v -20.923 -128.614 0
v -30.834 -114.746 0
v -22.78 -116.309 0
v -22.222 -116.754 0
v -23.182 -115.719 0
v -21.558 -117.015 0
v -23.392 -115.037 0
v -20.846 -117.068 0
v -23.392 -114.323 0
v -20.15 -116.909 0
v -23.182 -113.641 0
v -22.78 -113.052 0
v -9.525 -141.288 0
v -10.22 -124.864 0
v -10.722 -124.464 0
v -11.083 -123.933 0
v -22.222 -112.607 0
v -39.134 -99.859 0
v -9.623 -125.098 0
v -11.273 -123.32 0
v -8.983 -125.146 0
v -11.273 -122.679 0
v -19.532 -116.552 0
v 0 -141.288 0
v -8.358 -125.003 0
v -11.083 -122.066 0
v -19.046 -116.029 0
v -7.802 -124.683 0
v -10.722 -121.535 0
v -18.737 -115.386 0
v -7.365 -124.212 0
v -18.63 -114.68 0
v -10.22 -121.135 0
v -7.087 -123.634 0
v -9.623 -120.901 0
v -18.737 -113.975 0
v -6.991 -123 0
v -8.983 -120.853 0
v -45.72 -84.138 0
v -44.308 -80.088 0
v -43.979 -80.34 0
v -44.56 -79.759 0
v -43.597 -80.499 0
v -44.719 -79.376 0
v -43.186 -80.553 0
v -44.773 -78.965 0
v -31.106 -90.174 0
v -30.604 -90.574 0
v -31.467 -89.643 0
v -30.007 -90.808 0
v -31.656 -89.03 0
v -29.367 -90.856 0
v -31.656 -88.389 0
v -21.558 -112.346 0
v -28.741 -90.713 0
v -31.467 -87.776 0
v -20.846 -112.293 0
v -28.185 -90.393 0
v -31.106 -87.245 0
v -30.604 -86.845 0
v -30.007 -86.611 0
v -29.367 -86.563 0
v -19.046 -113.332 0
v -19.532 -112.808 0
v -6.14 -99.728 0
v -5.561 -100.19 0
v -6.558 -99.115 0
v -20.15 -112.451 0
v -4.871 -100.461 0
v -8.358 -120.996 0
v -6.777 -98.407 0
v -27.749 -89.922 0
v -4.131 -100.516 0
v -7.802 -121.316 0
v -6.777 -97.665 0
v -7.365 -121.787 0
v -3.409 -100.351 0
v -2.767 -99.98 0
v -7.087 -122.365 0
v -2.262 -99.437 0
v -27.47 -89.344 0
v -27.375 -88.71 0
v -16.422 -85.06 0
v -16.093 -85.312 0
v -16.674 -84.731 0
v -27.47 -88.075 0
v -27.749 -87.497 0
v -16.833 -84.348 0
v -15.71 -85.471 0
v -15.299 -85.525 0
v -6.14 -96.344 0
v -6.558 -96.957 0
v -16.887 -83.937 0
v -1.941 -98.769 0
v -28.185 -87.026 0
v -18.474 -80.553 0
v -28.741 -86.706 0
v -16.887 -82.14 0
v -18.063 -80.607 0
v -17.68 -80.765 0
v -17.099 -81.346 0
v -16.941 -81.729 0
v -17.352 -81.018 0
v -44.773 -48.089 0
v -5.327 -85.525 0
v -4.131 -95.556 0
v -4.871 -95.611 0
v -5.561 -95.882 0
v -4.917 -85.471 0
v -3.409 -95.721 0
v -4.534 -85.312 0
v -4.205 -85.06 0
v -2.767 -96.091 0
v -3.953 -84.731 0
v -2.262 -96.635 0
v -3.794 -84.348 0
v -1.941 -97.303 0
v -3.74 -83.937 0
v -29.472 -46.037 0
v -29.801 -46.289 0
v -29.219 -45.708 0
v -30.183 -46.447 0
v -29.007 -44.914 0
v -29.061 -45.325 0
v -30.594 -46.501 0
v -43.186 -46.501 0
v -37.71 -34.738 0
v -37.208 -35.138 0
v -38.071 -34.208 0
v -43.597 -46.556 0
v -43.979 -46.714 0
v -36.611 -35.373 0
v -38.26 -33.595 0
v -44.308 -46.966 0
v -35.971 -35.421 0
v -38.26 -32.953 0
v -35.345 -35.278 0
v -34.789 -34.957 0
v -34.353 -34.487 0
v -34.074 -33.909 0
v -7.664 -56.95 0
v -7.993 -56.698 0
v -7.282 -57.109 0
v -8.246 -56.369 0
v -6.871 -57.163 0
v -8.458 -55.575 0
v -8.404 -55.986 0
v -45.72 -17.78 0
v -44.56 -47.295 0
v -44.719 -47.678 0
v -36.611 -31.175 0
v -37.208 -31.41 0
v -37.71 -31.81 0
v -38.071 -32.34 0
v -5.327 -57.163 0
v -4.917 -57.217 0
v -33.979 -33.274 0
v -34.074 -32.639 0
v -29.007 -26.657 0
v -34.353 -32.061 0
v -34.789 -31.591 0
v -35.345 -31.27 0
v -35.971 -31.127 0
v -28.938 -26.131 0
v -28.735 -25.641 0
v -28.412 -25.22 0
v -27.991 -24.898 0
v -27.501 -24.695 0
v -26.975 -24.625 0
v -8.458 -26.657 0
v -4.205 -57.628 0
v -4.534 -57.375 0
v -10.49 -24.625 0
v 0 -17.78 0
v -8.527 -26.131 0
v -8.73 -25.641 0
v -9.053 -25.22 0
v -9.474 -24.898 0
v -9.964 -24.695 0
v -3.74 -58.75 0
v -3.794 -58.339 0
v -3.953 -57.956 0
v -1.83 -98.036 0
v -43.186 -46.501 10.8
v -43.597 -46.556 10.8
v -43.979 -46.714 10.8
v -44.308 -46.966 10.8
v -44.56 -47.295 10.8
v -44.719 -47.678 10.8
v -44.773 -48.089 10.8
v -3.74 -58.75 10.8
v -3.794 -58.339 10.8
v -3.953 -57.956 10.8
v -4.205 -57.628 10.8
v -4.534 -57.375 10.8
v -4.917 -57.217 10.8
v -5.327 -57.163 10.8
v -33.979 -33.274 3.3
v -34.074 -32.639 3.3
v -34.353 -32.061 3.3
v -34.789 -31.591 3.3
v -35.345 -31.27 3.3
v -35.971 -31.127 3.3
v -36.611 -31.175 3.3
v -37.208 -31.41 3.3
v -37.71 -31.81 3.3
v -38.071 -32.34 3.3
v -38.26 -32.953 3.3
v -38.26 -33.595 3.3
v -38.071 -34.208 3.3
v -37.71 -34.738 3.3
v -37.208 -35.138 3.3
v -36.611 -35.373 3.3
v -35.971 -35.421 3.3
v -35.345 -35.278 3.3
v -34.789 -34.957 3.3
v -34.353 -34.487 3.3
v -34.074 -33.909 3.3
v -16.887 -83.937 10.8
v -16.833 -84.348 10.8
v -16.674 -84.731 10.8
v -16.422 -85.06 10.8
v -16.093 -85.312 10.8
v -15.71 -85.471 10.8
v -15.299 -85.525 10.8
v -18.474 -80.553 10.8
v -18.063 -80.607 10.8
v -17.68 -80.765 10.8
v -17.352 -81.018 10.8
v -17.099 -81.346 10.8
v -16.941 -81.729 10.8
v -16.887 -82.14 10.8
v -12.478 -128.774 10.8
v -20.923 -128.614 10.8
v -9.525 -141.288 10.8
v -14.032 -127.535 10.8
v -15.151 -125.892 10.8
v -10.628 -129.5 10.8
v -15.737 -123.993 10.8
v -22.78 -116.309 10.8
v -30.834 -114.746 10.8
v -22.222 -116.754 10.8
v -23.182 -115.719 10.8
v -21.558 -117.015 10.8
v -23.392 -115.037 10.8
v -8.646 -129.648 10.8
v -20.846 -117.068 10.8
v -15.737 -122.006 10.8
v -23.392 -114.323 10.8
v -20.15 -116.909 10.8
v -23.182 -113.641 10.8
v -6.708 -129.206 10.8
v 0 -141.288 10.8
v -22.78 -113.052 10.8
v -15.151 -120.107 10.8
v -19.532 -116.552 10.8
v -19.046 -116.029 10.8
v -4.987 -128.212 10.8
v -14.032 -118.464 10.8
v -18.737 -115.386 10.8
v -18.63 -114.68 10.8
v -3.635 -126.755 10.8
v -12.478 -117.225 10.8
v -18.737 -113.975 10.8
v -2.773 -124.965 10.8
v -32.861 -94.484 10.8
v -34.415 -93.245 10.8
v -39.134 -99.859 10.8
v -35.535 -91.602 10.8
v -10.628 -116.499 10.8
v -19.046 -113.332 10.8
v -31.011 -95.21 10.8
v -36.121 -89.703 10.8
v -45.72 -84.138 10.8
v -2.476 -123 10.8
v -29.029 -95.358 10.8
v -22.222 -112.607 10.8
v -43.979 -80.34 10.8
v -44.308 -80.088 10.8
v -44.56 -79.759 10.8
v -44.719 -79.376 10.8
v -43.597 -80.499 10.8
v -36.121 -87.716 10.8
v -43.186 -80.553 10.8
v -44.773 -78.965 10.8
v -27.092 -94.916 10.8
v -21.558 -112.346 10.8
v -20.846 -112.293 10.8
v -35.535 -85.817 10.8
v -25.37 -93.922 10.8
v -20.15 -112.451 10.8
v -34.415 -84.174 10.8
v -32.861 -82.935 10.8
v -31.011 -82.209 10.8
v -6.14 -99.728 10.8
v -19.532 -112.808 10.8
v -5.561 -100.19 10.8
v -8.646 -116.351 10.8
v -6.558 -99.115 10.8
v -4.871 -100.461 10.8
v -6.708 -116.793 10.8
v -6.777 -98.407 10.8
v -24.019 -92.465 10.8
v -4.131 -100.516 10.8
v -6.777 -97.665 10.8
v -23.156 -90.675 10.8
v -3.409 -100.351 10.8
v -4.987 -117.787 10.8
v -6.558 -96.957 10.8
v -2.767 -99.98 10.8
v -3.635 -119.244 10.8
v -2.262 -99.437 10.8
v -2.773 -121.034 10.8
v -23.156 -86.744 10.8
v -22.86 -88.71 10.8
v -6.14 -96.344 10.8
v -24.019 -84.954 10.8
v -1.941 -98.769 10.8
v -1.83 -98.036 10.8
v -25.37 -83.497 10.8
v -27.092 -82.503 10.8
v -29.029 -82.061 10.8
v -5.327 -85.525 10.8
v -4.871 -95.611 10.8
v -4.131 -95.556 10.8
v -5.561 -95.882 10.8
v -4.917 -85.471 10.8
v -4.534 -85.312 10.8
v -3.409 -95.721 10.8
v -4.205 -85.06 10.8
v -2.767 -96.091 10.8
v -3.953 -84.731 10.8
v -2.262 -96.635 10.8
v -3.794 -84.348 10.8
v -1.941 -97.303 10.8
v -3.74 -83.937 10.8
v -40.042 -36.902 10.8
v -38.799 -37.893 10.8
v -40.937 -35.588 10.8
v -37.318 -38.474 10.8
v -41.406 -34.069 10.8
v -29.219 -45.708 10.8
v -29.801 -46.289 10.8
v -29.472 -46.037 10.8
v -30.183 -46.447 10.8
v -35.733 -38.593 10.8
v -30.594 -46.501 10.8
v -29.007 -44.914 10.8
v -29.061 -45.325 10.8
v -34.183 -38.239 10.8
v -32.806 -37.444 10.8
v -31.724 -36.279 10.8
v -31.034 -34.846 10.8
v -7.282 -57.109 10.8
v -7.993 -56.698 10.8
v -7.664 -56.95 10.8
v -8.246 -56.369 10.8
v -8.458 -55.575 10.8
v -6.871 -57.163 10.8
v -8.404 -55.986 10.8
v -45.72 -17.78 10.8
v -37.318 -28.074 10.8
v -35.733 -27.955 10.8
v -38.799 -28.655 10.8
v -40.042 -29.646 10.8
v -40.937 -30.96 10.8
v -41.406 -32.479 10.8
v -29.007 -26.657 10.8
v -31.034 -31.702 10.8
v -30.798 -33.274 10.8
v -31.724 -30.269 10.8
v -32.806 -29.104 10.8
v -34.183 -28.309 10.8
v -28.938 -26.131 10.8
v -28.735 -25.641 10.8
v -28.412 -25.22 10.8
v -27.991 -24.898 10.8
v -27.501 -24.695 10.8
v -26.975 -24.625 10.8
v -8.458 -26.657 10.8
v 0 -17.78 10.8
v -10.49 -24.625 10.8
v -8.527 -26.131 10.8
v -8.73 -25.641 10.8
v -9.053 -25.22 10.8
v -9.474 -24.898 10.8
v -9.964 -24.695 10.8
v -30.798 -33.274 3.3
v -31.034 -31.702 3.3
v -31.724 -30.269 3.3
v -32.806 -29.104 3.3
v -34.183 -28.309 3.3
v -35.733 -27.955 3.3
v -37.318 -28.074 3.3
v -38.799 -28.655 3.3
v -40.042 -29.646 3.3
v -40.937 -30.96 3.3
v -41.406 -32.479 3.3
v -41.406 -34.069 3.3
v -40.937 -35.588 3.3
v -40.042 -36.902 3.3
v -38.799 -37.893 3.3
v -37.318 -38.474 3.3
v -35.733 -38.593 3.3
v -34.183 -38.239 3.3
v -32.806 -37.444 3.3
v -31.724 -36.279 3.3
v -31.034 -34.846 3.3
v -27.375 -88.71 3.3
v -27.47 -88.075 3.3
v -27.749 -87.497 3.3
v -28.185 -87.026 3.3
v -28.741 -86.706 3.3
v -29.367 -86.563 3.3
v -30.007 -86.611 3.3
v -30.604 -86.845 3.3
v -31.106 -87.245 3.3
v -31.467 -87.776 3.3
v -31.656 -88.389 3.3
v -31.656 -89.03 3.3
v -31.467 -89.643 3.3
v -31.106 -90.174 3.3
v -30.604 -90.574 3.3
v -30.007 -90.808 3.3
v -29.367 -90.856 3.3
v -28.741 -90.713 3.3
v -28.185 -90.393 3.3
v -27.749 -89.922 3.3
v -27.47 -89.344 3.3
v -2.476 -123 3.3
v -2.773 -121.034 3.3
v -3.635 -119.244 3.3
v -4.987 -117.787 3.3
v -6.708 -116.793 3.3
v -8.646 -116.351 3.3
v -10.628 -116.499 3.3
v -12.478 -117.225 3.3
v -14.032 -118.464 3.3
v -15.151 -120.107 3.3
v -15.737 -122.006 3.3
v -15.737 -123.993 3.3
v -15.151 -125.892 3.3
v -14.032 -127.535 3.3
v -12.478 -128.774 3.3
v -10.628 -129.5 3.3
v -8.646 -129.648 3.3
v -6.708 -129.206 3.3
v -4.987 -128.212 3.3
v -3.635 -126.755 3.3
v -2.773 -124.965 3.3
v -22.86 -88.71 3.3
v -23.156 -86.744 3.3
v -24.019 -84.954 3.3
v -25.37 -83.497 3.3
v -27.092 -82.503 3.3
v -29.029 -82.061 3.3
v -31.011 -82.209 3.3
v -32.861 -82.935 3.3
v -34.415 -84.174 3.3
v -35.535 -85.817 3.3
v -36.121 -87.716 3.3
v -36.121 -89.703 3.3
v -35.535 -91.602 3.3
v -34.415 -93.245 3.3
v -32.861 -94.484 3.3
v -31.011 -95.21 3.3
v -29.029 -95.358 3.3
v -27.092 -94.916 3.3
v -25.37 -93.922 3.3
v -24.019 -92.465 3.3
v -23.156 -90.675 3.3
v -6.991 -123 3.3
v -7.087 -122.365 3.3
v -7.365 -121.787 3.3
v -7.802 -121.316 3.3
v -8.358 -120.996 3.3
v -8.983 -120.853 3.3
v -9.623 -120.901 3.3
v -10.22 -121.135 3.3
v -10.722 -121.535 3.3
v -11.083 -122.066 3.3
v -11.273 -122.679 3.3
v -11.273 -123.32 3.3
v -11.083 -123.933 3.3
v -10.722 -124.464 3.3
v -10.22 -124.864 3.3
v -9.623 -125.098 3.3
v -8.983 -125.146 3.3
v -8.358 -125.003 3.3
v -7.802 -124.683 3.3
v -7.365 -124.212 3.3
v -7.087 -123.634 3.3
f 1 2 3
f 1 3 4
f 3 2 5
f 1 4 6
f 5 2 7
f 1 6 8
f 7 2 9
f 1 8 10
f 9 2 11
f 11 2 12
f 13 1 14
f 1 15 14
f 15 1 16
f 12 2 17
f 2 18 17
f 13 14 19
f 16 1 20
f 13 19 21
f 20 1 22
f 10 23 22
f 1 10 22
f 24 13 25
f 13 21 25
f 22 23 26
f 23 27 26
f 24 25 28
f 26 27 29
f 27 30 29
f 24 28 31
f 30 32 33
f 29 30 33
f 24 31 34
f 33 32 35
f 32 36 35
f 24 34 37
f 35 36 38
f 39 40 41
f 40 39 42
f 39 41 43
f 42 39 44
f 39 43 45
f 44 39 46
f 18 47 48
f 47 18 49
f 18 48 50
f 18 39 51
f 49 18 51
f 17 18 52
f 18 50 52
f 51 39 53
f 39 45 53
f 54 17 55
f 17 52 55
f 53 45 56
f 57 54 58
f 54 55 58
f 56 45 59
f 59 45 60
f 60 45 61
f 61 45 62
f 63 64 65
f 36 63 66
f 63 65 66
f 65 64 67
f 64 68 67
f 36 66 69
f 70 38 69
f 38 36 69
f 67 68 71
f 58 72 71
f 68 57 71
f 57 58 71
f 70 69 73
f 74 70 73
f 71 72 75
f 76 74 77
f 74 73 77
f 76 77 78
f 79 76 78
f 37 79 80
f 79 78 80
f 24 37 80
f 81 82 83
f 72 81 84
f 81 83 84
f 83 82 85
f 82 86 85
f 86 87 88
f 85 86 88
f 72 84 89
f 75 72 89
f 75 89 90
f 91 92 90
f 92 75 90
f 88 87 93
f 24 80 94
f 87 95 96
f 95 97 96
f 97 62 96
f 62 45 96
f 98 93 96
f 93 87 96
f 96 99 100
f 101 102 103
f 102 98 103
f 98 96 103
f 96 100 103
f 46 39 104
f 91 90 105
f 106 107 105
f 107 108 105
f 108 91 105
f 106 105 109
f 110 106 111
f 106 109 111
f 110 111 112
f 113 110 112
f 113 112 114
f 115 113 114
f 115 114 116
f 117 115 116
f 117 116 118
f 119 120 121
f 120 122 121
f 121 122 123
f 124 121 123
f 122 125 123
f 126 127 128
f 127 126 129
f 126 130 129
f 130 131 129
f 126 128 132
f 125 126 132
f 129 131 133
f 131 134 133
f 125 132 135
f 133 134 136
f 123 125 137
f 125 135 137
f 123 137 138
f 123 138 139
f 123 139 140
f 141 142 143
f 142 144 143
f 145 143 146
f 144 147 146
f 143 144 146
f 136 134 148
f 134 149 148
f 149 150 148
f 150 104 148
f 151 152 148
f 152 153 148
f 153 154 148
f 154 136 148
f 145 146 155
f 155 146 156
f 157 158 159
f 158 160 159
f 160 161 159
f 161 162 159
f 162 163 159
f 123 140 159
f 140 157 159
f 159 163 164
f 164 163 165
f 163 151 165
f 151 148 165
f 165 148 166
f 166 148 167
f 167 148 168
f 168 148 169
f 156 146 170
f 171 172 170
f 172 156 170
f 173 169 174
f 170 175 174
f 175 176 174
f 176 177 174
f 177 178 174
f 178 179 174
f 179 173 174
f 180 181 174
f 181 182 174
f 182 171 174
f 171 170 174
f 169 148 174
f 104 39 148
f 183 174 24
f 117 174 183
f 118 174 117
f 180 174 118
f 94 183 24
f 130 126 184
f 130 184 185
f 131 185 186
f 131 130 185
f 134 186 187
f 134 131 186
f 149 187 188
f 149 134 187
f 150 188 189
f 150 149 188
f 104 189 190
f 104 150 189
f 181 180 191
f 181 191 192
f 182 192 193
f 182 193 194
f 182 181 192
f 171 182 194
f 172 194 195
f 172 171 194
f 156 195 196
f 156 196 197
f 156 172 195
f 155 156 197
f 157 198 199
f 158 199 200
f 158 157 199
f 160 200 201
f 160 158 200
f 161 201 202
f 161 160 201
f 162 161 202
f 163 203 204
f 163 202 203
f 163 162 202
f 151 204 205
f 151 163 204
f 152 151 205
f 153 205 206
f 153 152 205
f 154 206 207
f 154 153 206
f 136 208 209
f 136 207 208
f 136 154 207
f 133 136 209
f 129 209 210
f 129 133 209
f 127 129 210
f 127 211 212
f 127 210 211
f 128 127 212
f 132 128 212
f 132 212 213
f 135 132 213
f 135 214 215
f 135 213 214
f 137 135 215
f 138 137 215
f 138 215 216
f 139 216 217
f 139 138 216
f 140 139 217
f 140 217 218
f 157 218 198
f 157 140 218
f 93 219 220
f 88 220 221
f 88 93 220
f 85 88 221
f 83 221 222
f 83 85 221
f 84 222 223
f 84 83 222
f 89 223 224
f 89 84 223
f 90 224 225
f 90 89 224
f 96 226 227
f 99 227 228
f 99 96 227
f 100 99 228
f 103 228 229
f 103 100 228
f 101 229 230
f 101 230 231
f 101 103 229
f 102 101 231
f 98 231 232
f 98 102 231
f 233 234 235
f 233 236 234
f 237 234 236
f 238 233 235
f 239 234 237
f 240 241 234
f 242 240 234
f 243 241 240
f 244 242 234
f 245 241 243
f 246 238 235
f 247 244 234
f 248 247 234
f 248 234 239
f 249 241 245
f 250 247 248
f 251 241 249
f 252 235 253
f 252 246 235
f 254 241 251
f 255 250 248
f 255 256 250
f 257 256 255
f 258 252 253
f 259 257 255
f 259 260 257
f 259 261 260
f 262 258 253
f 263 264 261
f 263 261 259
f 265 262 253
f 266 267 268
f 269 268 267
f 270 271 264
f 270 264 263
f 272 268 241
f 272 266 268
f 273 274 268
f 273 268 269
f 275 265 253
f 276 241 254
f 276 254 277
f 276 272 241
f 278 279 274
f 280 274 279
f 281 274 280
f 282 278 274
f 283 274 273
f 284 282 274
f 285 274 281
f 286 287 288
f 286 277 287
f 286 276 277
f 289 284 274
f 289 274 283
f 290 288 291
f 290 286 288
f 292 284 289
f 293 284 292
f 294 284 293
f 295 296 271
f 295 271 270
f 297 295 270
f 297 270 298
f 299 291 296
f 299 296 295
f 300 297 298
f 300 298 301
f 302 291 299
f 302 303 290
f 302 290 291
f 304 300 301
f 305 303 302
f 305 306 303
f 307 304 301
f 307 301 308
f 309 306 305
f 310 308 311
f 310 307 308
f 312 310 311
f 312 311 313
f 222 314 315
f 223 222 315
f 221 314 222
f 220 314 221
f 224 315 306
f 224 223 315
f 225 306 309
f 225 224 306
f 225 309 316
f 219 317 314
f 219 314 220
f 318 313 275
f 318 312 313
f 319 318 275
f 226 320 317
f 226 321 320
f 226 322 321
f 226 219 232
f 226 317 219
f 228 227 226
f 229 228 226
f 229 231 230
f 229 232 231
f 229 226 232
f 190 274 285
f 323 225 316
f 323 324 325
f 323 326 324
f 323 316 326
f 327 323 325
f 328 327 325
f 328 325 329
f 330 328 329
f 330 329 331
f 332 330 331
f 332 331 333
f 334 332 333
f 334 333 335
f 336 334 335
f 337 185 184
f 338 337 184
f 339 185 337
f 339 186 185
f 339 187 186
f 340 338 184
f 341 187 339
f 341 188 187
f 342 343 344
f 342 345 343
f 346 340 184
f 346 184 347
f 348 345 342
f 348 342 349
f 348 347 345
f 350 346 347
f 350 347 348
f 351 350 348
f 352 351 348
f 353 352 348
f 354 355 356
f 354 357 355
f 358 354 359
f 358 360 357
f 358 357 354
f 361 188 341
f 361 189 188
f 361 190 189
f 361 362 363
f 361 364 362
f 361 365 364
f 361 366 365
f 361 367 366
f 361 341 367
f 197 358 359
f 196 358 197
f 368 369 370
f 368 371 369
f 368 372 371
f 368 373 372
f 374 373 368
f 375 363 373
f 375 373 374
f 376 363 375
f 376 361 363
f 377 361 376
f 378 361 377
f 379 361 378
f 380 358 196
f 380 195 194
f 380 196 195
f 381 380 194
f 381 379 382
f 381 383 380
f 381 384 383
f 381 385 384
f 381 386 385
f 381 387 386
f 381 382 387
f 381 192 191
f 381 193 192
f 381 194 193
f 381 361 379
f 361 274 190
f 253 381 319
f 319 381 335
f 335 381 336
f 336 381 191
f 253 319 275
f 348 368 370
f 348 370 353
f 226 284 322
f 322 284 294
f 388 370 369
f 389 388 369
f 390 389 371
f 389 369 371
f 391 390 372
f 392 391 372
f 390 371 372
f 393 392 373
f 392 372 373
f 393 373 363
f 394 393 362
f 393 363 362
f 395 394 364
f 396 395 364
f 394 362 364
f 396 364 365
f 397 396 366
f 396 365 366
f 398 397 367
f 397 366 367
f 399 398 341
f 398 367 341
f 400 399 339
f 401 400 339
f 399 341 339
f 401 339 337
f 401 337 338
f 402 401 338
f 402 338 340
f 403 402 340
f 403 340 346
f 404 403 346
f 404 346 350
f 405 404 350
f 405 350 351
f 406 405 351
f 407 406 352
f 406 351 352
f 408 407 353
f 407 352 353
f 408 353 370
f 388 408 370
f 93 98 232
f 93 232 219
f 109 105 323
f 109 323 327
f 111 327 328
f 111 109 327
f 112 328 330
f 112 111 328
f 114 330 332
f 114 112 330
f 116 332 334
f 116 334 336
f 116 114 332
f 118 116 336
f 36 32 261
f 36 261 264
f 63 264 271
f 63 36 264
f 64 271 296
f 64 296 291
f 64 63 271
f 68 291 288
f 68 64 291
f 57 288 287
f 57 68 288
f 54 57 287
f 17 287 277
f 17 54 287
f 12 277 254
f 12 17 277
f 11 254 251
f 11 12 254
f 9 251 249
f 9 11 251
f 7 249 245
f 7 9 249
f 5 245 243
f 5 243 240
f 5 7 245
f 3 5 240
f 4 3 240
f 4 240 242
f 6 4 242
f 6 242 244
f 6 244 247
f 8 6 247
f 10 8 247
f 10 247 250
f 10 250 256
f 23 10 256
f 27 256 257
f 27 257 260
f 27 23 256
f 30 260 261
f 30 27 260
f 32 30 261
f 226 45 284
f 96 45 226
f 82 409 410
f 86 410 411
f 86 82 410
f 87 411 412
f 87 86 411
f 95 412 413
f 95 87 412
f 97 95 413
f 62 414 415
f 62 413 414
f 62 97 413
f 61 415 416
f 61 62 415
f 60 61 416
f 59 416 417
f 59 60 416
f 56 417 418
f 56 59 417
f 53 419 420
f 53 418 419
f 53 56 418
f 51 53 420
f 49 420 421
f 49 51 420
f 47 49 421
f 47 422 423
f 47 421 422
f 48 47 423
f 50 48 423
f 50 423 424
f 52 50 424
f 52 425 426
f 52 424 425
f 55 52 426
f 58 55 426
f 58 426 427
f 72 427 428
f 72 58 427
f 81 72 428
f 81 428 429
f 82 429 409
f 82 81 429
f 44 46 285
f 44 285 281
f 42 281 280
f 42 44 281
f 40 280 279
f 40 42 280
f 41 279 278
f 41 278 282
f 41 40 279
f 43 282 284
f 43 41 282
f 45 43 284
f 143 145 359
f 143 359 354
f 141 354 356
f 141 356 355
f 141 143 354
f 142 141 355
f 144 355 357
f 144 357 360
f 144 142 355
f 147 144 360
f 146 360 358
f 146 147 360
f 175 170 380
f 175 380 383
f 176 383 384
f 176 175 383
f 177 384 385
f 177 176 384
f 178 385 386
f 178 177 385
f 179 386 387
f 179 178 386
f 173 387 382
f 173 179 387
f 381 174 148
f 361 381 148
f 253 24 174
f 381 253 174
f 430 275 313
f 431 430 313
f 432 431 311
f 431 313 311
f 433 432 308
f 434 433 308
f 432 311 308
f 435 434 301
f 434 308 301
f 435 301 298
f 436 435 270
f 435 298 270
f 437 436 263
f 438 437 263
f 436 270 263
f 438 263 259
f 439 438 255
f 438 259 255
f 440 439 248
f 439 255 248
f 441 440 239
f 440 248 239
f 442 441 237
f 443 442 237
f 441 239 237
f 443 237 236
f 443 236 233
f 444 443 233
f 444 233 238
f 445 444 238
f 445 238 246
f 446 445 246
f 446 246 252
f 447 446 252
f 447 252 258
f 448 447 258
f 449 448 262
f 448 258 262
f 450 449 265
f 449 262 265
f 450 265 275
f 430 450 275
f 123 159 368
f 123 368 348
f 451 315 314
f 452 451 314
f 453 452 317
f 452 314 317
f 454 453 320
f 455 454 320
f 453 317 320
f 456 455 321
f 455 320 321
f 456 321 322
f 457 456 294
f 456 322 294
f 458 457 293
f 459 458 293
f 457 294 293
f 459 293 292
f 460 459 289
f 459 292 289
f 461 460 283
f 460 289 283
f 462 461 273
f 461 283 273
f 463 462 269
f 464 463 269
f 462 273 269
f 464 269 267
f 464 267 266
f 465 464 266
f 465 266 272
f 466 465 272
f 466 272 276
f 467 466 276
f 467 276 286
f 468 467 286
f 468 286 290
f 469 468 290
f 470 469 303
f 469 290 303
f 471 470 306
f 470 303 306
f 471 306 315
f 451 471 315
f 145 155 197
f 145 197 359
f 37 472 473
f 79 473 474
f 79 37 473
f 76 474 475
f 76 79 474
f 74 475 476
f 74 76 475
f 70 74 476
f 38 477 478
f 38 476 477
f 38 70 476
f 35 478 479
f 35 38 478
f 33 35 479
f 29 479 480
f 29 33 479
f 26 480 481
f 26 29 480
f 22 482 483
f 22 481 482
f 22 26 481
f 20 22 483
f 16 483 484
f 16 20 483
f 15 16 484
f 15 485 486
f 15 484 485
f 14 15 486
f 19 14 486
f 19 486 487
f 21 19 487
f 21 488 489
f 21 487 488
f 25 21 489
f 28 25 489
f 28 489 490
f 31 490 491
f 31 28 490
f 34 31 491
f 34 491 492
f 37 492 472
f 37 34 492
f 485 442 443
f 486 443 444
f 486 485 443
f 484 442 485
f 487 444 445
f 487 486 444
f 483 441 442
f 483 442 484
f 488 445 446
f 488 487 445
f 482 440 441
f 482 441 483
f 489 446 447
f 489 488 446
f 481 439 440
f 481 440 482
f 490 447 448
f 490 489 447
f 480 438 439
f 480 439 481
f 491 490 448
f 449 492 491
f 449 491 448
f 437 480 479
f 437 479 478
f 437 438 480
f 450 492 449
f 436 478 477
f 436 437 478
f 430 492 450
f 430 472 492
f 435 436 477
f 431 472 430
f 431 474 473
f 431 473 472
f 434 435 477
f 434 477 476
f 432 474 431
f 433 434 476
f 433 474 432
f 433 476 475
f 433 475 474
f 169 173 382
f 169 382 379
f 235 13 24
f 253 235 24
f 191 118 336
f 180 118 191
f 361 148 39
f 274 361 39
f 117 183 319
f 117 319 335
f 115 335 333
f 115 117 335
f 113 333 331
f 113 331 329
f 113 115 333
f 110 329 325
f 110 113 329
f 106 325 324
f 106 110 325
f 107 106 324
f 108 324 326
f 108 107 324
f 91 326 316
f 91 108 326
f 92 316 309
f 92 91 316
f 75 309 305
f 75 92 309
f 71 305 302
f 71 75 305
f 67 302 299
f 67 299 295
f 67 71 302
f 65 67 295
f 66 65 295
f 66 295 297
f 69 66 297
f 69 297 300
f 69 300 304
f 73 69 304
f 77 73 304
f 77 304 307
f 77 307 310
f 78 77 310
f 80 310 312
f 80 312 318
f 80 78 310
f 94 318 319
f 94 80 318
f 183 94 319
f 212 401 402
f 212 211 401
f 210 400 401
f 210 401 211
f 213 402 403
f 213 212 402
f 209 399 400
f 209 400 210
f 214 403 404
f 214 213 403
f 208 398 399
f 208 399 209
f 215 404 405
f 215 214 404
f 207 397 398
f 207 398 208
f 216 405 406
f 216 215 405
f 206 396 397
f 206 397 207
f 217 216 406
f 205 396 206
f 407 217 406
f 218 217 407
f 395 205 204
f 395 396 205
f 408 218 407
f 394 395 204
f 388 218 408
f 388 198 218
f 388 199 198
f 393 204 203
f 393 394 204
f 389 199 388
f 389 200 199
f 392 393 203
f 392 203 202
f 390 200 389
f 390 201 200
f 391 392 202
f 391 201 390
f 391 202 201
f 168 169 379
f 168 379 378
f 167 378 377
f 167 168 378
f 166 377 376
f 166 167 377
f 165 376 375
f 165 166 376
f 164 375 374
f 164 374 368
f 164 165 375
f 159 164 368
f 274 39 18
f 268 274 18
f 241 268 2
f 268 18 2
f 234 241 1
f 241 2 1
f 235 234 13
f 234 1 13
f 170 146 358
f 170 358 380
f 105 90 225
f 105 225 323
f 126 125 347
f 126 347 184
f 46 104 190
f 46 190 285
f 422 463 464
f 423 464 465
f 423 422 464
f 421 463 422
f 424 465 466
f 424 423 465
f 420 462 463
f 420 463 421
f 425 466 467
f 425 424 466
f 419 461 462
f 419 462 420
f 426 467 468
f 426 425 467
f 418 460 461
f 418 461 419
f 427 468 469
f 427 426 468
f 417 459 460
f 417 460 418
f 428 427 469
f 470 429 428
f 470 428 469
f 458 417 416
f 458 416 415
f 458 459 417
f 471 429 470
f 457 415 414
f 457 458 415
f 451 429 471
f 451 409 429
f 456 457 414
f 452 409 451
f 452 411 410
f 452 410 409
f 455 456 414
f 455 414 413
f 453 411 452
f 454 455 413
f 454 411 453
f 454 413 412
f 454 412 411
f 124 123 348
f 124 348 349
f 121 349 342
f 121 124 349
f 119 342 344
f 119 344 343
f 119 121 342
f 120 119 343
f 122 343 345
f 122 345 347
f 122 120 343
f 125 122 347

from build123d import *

# Parameters (mm, degrees)
SKETCH1_R           = 2.15265
SKETCH1_R_2         = 2.487009827
SKETCH1_R_3         = 2.39450721
BOSS_EXTRUDE1_DEPTH = 10.8
SKETCH3_R           = 6.6675
SKETCH3_R_2         = 5.334
CUT_EXTRUDE1_DEPTH  = 7.5


with BuildPart() as part:
    # Sketch1 → Boss-Extrude1 (new body)
    with BuildSketch(Plane.XY):
        with BuildLine():
            Line((0, -17.78), (-45.72, -17.78))
            Line((-45.72, -17.78), (-45.72, -84.1375))
            ThreePointArc((-45.72, -84.1375), (-30.833523511, -114.746148224), (-9.525, -141.2875))
            Line((-9.525, -141.2875), (0, -141.2875))
            Line((0, -141.2875), (0, -17.78))
        make_face()
        with Locations((-36.1315, -33.274)):
            Circle(SKETCH1_R, mode=Mode.SUBTRACT)
        with Locations((-29.5275, -88.7095)):
            Circle(SKETCH1_R, mode=Mode.SUBTRACT)
        with Locations((-9.144, -122.9995)):
            Circle(SKETCH1_R, mode=Mode.SUBTRACT)
        with Locations((-4.3173518, -98.035919174)):
            Circle(SKETCH1_R_2, mode=Mode.SUBTRACT)
        with Locations((-21.024674116, -114.680376144)):
            Circle(SKETCH1_R_3, mode=Mode.SUBTRACT)
        with BuildLine():
            Line((-30.5943, -46.501483685), (-43.185677441, -46.501483685))
            ThreePointArc((-43.185677441, -46.501483685), (-44.308209457, -46.96645167), (-44.773177441, -48.088983685))
            Line((-44.773177441, -48.088983685), (-44.773177441, -78.965225138))
            ThreePointArc((-44.773177441, -78.965225138), (-44.308209457, -80.087757153), (-43.185677441, -80.552725138))
            Line((-43.185677441, -80.552725138), (-18.474223541, -80.552725138))
            ThreePointArc((-18.474223541, -80.552725138), (-17.351691526, -81.017693123), (-16.886723541, -82.140225138))
            Line((-16.886723541, -82.140225138), (-16.886723541, -83.937143103))
            ThreePointArc((-16.886723541, -83.937143103), (-16.421755557, -85.059675118), (-15.299223541, -85.524643103))
            Line((-15.299223541, -85.524643103), (-5.327492268, -85.524643103))
            ThreePointArc((-5.327492268, -85.524643103), (-4.204960252, -85.059675118), (-3.739992268, -83.937143103))
            Line((-3.739992268, -83.937143103), (-3.739992268, -58.7502))
            ThreePointArc((-3.739992268, -58.7502), (-4.204960252, -57.627667985), (-5.327492268, -57.1627))
            Line((-5.327492268, -57.1627), (-6.8707, -57.1627))
            ThreePointArc((-6.8707, -57.1627), (-7.993232015, -56.697732015), (-8.4582, -55.5752))
            Line((-8.4582, -55.5752), (-8.4582, -26.6573))
            ThreePointArc((-8.4582, -26.6573), (-9.053359021, -25.220459021), (-10.4902, -24.6253))
            Line((-10.4902, -24.6253), (-26.9748, -24.6253))
            ThreePointArc((-26.9748, -24.6253), (-28.411640979, -25.220459021), (-29.0068, -26.6573))
            Line((-29.0068, -26.6573), (-29.0068, -44.913983685))
            ThreePointArc((-29.0068, -44.913983685), (-29.471767985, -46.036515701), (-30.5943, -46.501483685))
        make_face(mode=Mode.SUBTRACT)
    extrude(amount=BOSS_EXTRUDE1_DEPTH)

    # Sketch3 → Cut-Extrude1 (cut)
    with BuildSketch(Plane.XY.offset(10.8)):
        with Locations((-9.144, -122.9995)):
            Circle(SKETCH3_R)
        with Locations((-29.5275, -88.7095)):
            Circle(SKETCH3_R)
        with Locations((-36.1315, -33.274)):
            Circle(SKETCH3_R_2)
    extrude(amount=-CUT_EXTRUDE1_DEPTH, mode=Mode.SUBTRACT)


solid = part.part
